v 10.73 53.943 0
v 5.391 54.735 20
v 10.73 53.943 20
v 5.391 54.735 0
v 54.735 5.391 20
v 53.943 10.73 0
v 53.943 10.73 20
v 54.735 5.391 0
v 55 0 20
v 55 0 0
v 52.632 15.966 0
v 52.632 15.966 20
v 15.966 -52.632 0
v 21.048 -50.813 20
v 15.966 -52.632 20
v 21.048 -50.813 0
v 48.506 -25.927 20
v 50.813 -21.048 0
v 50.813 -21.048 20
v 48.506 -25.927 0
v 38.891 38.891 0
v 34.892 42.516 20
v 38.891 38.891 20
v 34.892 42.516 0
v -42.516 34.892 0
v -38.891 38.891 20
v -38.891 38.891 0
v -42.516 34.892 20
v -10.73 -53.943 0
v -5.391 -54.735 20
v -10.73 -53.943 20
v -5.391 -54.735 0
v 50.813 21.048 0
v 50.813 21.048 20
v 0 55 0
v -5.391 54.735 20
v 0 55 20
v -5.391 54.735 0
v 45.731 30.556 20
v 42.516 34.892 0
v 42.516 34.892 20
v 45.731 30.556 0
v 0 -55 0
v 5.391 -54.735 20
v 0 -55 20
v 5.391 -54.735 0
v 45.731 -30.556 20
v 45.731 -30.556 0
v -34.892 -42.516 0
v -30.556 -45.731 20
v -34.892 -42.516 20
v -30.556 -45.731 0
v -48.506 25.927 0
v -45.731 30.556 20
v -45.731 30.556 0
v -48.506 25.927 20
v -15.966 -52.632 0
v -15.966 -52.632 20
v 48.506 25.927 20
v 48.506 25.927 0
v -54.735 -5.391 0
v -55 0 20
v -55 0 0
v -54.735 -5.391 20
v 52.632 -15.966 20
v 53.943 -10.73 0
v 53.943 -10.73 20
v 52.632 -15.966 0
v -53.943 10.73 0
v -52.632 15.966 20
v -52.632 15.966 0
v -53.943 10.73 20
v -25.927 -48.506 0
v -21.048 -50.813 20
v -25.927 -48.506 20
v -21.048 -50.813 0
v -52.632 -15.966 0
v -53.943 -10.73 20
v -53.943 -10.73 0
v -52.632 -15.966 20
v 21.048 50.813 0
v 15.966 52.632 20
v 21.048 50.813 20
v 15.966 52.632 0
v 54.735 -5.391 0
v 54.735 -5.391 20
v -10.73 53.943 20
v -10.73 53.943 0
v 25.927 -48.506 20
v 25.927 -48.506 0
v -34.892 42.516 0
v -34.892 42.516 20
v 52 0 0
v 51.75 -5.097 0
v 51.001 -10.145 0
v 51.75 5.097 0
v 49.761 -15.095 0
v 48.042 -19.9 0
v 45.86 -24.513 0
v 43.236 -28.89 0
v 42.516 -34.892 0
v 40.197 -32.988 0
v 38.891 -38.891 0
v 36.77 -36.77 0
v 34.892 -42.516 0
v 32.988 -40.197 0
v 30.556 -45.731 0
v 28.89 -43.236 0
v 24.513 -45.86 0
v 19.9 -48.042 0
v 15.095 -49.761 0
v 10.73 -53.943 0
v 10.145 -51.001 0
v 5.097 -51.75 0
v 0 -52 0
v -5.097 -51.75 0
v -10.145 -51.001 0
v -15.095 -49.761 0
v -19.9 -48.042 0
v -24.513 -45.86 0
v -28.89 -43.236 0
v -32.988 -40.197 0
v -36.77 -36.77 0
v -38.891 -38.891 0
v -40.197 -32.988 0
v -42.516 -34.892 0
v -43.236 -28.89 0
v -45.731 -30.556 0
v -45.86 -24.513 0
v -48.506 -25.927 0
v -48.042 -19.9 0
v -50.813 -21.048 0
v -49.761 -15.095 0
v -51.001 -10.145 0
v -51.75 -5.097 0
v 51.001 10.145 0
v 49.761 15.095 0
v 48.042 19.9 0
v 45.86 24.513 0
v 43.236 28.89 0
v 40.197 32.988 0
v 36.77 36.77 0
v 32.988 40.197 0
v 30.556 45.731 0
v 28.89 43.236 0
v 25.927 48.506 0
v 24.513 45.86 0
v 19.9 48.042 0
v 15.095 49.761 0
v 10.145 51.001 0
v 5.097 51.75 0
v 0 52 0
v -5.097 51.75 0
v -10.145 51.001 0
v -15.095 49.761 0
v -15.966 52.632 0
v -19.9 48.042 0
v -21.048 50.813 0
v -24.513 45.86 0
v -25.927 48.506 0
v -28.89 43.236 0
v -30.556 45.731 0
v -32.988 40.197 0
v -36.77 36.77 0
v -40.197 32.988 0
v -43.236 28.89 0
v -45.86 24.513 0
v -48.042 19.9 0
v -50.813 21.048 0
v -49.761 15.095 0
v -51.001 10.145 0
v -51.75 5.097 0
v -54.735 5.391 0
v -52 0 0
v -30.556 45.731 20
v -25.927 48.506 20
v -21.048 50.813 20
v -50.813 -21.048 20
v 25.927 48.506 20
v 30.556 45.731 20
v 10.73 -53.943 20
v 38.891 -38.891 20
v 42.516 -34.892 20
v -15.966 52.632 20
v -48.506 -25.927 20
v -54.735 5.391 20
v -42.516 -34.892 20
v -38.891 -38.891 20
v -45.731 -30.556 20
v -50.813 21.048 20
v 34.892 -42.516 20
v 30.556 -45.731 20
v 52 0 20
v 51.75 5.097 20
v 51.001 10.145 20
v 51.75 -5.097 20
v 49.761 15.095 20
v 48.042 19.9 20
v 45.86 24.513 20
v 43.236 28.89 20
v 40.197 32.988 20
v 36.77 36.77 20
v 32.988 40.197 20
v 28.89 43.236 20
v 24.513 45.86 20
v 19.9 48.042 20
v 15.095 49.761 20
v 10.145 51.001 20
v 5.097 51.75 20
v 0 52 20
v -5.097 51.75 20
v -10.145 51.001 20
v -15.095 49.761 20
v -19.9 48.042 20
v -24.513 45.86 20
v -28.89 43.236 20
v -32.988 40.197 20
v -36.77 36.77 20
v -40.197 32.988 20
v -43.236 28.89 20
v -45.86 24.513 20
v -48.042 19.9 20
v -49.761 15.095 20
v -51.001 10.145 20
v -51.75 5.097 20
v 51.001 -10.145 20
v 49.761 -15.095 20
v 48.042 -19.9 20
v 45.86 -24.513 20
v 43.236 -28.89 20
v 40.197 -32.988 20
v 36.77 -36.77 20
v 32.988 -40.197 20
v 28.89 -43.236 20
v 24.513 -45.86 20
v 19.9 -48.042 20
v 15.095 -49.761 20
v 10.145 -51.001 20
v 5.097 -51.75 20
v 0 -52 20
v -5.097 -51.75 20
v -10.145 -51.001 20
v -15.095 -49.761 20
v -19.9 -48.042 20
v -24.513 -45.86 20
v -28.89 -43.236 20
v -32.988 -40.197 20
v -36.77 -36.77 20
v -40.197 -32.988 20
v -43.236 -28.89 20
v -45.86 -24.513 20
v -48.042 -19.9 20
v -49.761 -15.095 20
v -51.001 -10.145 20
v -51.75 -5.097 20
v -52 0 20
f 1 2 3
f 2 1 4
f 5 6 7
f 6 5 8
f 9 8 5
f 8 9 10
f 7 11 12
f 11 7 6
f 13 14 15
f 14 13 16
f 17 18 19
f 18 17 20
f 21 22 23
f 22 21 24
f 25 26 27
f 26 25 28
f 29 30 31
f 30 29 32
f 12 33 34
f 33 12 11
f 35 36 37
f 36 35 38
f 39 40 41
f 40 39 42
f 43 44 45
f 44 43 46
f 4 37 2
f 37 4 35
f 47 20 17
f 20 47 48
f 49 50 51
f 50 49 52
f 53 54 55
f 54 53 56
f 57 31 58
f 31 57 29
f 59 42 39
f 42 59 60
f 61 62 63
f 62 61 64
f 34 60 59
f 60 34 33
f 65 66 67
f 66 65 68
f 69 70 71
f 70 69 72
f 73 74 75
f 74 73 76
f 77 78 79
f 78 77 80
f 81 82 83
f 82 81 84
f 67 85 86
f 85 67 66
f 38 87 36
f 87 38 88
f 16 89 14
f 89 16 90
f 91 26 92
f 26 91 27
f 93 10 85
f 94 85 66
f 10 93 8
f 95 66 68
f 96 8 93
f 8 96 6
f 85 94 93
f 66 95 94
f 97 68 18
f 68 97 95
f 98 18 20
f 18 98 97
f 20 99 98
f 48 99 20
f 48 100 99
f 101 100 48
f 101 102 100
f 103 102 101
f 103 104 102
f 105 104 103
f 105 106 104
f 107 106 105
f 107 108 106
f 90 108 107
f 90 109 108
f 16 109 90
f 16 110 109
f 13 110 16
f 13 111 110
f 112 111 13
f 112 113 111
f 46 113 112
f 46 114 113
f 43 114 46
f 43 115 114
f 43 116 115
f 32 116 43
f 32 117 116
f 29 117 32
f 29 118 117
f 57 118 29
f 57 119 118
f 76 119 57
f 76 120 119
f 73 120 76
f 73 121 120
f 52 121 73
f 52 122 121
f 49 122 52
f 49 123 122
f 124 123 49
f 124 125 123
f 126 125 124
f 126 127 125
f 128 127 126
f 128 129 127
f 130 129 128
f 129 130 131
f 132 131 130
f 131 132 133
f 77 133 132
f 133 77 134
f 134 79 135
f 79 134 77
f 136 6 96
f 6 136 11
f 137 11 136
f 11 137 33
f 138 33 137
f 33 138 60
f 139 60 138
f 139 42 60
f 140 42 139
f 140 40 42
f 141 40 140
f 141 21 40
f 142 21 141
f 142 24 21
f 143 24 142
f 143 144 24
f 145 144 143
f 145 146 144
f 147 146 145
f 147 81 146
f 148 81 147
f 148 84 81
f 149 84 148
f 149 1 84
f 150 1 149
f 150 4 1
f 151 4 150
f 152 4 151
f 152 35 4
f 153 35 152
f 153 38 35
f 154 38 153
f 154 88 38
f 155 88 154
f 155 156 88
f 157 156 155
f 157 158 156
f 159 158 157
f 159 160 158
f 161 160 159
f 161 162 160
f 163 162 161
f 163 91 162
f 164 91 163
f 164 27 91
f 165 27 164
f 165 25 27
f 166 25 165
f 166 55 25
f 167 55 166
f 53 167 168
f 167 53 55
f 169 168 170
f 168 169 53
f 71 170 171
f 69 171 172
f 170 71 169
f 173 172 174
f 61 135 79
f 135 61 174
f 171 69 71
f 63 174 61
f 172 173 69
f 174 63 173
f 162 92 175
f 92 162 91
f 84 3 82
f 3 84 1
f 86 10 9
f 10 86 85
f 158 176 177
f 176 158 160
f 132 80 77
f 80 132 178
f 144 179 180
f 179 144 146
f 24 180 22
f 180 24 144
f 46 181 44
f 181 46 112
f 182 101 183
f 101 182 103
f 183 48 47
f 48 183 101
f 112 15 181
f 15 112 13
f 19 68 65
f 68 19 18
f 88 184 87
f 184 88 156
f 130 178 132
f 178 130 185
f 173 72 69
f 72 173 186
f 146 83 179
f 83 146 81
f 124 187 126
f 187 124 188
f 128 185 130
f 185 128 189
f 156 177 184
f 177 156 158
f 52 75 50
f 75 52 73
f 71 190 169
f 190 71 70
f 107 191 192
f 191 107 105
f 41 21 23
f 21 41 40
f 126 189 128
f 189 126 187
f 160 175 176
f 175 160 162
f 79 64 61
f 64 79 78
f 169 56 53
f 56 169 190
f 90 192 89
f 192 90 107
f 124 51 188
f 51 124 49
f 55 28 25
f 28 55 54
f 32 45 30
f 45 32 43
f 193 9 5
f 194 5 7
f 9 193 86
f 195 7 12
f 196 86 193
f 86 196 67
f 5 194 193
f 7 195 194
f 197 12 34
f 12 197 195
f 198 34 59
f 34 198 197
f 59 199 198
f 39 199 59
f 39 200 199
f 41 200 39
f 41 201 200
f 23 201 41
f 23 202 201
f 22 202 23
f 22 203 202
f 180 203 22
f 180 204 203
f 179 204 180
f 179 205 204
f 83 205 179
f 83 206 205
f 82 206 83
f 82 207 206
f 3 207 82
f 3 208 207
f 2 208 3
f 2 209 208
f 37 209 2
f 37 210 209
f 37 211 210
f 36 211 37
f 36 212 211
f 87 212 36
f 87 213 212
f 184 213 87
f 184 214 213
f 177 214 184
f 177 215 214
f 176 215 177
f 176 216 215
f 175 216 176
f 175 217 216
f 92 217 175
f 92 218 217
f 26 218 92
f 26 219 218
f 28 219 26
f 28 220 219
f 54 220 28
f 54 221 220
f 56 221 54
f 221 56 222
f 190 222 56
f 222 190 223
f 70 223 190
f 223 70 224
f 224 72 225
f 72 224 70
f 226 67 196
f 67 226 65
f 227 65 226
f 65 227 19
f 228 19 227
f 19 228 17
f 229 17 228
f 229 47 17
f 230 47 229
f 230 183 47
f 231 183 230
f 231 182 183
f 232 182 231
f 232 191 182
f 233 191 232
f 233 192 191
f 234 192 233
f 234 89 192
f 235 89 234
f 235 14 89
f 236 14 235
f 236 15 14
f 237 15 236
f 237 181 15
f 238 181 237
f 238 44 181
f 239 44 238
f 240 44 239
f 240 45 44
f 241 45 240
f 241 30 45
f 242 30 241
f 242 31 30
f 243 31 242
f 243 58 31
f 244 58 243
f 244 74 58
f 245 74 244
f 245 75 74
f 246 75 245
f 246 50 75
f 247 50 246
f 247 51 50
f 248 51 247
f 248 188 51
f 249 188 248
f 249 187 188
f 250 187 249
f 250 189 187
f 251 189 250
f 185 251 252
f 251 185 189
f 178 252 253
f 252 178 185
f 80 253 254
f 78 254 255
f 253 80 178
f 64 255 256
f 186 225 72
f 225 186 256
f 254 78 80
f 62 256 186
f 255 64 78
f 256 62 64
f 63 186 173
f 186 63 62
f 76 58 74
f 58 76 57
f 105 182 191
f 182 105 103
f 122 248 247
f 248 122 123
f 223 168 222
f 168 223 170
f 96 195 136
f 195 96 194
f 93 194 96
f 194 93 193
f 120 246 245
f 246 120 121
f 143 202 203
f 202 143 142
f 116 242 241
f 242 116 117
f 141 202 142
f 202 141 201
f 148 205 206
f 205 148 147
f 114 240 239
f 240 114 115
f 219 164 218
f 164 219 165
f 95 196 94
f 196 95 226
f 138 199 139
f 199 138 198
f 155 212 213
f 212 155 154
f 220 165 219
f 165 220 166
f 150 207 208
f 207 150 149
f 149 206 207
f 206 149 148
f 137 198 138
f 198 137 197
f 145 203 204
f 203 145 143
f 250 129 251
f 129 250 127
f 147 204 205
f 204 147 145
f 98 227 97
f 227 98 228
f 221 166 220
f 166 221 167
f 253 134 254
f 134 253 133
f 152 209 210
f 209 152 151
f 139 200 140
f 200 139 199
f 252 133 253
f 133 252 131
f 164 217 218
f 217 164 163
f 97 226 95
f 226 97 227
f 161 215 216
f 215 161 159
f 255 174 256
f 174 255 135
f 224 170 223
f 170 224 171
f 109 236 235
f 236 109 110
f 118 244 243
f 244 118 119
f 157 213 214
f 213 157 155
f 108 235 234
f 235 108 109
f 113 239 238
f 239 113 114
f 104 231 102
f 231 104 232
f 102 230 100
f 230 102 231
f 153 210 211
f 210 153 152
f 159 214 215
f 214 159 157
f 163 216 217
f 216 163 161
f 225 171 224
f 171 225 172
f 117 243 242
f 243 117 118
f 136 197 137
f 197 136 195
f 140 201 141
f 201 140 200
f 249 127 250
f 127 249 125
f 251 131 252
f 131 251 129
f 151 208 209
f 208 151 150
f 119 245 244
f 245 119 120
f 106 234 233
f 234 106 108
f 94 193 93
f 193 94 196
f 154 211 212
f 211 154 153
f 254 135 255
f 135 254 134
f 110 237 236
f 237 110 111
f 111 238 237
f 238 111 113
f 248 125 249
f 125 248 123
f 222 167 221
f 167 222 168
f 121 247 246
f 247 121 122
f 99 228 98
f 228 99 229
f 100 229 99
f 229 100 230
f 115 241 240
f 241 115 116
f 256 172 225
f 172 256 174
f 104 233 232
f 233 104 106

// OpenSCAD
module ht_110_cap() {
    difference() {
        // Outer cap
        cylinder(h=20, d=110, $fn=64);
        // Inner hollow part
        translate([0, 0, -1])
            cylinder(h=21, d=104, $fn=64);
    }
}

ht_110_cap();
